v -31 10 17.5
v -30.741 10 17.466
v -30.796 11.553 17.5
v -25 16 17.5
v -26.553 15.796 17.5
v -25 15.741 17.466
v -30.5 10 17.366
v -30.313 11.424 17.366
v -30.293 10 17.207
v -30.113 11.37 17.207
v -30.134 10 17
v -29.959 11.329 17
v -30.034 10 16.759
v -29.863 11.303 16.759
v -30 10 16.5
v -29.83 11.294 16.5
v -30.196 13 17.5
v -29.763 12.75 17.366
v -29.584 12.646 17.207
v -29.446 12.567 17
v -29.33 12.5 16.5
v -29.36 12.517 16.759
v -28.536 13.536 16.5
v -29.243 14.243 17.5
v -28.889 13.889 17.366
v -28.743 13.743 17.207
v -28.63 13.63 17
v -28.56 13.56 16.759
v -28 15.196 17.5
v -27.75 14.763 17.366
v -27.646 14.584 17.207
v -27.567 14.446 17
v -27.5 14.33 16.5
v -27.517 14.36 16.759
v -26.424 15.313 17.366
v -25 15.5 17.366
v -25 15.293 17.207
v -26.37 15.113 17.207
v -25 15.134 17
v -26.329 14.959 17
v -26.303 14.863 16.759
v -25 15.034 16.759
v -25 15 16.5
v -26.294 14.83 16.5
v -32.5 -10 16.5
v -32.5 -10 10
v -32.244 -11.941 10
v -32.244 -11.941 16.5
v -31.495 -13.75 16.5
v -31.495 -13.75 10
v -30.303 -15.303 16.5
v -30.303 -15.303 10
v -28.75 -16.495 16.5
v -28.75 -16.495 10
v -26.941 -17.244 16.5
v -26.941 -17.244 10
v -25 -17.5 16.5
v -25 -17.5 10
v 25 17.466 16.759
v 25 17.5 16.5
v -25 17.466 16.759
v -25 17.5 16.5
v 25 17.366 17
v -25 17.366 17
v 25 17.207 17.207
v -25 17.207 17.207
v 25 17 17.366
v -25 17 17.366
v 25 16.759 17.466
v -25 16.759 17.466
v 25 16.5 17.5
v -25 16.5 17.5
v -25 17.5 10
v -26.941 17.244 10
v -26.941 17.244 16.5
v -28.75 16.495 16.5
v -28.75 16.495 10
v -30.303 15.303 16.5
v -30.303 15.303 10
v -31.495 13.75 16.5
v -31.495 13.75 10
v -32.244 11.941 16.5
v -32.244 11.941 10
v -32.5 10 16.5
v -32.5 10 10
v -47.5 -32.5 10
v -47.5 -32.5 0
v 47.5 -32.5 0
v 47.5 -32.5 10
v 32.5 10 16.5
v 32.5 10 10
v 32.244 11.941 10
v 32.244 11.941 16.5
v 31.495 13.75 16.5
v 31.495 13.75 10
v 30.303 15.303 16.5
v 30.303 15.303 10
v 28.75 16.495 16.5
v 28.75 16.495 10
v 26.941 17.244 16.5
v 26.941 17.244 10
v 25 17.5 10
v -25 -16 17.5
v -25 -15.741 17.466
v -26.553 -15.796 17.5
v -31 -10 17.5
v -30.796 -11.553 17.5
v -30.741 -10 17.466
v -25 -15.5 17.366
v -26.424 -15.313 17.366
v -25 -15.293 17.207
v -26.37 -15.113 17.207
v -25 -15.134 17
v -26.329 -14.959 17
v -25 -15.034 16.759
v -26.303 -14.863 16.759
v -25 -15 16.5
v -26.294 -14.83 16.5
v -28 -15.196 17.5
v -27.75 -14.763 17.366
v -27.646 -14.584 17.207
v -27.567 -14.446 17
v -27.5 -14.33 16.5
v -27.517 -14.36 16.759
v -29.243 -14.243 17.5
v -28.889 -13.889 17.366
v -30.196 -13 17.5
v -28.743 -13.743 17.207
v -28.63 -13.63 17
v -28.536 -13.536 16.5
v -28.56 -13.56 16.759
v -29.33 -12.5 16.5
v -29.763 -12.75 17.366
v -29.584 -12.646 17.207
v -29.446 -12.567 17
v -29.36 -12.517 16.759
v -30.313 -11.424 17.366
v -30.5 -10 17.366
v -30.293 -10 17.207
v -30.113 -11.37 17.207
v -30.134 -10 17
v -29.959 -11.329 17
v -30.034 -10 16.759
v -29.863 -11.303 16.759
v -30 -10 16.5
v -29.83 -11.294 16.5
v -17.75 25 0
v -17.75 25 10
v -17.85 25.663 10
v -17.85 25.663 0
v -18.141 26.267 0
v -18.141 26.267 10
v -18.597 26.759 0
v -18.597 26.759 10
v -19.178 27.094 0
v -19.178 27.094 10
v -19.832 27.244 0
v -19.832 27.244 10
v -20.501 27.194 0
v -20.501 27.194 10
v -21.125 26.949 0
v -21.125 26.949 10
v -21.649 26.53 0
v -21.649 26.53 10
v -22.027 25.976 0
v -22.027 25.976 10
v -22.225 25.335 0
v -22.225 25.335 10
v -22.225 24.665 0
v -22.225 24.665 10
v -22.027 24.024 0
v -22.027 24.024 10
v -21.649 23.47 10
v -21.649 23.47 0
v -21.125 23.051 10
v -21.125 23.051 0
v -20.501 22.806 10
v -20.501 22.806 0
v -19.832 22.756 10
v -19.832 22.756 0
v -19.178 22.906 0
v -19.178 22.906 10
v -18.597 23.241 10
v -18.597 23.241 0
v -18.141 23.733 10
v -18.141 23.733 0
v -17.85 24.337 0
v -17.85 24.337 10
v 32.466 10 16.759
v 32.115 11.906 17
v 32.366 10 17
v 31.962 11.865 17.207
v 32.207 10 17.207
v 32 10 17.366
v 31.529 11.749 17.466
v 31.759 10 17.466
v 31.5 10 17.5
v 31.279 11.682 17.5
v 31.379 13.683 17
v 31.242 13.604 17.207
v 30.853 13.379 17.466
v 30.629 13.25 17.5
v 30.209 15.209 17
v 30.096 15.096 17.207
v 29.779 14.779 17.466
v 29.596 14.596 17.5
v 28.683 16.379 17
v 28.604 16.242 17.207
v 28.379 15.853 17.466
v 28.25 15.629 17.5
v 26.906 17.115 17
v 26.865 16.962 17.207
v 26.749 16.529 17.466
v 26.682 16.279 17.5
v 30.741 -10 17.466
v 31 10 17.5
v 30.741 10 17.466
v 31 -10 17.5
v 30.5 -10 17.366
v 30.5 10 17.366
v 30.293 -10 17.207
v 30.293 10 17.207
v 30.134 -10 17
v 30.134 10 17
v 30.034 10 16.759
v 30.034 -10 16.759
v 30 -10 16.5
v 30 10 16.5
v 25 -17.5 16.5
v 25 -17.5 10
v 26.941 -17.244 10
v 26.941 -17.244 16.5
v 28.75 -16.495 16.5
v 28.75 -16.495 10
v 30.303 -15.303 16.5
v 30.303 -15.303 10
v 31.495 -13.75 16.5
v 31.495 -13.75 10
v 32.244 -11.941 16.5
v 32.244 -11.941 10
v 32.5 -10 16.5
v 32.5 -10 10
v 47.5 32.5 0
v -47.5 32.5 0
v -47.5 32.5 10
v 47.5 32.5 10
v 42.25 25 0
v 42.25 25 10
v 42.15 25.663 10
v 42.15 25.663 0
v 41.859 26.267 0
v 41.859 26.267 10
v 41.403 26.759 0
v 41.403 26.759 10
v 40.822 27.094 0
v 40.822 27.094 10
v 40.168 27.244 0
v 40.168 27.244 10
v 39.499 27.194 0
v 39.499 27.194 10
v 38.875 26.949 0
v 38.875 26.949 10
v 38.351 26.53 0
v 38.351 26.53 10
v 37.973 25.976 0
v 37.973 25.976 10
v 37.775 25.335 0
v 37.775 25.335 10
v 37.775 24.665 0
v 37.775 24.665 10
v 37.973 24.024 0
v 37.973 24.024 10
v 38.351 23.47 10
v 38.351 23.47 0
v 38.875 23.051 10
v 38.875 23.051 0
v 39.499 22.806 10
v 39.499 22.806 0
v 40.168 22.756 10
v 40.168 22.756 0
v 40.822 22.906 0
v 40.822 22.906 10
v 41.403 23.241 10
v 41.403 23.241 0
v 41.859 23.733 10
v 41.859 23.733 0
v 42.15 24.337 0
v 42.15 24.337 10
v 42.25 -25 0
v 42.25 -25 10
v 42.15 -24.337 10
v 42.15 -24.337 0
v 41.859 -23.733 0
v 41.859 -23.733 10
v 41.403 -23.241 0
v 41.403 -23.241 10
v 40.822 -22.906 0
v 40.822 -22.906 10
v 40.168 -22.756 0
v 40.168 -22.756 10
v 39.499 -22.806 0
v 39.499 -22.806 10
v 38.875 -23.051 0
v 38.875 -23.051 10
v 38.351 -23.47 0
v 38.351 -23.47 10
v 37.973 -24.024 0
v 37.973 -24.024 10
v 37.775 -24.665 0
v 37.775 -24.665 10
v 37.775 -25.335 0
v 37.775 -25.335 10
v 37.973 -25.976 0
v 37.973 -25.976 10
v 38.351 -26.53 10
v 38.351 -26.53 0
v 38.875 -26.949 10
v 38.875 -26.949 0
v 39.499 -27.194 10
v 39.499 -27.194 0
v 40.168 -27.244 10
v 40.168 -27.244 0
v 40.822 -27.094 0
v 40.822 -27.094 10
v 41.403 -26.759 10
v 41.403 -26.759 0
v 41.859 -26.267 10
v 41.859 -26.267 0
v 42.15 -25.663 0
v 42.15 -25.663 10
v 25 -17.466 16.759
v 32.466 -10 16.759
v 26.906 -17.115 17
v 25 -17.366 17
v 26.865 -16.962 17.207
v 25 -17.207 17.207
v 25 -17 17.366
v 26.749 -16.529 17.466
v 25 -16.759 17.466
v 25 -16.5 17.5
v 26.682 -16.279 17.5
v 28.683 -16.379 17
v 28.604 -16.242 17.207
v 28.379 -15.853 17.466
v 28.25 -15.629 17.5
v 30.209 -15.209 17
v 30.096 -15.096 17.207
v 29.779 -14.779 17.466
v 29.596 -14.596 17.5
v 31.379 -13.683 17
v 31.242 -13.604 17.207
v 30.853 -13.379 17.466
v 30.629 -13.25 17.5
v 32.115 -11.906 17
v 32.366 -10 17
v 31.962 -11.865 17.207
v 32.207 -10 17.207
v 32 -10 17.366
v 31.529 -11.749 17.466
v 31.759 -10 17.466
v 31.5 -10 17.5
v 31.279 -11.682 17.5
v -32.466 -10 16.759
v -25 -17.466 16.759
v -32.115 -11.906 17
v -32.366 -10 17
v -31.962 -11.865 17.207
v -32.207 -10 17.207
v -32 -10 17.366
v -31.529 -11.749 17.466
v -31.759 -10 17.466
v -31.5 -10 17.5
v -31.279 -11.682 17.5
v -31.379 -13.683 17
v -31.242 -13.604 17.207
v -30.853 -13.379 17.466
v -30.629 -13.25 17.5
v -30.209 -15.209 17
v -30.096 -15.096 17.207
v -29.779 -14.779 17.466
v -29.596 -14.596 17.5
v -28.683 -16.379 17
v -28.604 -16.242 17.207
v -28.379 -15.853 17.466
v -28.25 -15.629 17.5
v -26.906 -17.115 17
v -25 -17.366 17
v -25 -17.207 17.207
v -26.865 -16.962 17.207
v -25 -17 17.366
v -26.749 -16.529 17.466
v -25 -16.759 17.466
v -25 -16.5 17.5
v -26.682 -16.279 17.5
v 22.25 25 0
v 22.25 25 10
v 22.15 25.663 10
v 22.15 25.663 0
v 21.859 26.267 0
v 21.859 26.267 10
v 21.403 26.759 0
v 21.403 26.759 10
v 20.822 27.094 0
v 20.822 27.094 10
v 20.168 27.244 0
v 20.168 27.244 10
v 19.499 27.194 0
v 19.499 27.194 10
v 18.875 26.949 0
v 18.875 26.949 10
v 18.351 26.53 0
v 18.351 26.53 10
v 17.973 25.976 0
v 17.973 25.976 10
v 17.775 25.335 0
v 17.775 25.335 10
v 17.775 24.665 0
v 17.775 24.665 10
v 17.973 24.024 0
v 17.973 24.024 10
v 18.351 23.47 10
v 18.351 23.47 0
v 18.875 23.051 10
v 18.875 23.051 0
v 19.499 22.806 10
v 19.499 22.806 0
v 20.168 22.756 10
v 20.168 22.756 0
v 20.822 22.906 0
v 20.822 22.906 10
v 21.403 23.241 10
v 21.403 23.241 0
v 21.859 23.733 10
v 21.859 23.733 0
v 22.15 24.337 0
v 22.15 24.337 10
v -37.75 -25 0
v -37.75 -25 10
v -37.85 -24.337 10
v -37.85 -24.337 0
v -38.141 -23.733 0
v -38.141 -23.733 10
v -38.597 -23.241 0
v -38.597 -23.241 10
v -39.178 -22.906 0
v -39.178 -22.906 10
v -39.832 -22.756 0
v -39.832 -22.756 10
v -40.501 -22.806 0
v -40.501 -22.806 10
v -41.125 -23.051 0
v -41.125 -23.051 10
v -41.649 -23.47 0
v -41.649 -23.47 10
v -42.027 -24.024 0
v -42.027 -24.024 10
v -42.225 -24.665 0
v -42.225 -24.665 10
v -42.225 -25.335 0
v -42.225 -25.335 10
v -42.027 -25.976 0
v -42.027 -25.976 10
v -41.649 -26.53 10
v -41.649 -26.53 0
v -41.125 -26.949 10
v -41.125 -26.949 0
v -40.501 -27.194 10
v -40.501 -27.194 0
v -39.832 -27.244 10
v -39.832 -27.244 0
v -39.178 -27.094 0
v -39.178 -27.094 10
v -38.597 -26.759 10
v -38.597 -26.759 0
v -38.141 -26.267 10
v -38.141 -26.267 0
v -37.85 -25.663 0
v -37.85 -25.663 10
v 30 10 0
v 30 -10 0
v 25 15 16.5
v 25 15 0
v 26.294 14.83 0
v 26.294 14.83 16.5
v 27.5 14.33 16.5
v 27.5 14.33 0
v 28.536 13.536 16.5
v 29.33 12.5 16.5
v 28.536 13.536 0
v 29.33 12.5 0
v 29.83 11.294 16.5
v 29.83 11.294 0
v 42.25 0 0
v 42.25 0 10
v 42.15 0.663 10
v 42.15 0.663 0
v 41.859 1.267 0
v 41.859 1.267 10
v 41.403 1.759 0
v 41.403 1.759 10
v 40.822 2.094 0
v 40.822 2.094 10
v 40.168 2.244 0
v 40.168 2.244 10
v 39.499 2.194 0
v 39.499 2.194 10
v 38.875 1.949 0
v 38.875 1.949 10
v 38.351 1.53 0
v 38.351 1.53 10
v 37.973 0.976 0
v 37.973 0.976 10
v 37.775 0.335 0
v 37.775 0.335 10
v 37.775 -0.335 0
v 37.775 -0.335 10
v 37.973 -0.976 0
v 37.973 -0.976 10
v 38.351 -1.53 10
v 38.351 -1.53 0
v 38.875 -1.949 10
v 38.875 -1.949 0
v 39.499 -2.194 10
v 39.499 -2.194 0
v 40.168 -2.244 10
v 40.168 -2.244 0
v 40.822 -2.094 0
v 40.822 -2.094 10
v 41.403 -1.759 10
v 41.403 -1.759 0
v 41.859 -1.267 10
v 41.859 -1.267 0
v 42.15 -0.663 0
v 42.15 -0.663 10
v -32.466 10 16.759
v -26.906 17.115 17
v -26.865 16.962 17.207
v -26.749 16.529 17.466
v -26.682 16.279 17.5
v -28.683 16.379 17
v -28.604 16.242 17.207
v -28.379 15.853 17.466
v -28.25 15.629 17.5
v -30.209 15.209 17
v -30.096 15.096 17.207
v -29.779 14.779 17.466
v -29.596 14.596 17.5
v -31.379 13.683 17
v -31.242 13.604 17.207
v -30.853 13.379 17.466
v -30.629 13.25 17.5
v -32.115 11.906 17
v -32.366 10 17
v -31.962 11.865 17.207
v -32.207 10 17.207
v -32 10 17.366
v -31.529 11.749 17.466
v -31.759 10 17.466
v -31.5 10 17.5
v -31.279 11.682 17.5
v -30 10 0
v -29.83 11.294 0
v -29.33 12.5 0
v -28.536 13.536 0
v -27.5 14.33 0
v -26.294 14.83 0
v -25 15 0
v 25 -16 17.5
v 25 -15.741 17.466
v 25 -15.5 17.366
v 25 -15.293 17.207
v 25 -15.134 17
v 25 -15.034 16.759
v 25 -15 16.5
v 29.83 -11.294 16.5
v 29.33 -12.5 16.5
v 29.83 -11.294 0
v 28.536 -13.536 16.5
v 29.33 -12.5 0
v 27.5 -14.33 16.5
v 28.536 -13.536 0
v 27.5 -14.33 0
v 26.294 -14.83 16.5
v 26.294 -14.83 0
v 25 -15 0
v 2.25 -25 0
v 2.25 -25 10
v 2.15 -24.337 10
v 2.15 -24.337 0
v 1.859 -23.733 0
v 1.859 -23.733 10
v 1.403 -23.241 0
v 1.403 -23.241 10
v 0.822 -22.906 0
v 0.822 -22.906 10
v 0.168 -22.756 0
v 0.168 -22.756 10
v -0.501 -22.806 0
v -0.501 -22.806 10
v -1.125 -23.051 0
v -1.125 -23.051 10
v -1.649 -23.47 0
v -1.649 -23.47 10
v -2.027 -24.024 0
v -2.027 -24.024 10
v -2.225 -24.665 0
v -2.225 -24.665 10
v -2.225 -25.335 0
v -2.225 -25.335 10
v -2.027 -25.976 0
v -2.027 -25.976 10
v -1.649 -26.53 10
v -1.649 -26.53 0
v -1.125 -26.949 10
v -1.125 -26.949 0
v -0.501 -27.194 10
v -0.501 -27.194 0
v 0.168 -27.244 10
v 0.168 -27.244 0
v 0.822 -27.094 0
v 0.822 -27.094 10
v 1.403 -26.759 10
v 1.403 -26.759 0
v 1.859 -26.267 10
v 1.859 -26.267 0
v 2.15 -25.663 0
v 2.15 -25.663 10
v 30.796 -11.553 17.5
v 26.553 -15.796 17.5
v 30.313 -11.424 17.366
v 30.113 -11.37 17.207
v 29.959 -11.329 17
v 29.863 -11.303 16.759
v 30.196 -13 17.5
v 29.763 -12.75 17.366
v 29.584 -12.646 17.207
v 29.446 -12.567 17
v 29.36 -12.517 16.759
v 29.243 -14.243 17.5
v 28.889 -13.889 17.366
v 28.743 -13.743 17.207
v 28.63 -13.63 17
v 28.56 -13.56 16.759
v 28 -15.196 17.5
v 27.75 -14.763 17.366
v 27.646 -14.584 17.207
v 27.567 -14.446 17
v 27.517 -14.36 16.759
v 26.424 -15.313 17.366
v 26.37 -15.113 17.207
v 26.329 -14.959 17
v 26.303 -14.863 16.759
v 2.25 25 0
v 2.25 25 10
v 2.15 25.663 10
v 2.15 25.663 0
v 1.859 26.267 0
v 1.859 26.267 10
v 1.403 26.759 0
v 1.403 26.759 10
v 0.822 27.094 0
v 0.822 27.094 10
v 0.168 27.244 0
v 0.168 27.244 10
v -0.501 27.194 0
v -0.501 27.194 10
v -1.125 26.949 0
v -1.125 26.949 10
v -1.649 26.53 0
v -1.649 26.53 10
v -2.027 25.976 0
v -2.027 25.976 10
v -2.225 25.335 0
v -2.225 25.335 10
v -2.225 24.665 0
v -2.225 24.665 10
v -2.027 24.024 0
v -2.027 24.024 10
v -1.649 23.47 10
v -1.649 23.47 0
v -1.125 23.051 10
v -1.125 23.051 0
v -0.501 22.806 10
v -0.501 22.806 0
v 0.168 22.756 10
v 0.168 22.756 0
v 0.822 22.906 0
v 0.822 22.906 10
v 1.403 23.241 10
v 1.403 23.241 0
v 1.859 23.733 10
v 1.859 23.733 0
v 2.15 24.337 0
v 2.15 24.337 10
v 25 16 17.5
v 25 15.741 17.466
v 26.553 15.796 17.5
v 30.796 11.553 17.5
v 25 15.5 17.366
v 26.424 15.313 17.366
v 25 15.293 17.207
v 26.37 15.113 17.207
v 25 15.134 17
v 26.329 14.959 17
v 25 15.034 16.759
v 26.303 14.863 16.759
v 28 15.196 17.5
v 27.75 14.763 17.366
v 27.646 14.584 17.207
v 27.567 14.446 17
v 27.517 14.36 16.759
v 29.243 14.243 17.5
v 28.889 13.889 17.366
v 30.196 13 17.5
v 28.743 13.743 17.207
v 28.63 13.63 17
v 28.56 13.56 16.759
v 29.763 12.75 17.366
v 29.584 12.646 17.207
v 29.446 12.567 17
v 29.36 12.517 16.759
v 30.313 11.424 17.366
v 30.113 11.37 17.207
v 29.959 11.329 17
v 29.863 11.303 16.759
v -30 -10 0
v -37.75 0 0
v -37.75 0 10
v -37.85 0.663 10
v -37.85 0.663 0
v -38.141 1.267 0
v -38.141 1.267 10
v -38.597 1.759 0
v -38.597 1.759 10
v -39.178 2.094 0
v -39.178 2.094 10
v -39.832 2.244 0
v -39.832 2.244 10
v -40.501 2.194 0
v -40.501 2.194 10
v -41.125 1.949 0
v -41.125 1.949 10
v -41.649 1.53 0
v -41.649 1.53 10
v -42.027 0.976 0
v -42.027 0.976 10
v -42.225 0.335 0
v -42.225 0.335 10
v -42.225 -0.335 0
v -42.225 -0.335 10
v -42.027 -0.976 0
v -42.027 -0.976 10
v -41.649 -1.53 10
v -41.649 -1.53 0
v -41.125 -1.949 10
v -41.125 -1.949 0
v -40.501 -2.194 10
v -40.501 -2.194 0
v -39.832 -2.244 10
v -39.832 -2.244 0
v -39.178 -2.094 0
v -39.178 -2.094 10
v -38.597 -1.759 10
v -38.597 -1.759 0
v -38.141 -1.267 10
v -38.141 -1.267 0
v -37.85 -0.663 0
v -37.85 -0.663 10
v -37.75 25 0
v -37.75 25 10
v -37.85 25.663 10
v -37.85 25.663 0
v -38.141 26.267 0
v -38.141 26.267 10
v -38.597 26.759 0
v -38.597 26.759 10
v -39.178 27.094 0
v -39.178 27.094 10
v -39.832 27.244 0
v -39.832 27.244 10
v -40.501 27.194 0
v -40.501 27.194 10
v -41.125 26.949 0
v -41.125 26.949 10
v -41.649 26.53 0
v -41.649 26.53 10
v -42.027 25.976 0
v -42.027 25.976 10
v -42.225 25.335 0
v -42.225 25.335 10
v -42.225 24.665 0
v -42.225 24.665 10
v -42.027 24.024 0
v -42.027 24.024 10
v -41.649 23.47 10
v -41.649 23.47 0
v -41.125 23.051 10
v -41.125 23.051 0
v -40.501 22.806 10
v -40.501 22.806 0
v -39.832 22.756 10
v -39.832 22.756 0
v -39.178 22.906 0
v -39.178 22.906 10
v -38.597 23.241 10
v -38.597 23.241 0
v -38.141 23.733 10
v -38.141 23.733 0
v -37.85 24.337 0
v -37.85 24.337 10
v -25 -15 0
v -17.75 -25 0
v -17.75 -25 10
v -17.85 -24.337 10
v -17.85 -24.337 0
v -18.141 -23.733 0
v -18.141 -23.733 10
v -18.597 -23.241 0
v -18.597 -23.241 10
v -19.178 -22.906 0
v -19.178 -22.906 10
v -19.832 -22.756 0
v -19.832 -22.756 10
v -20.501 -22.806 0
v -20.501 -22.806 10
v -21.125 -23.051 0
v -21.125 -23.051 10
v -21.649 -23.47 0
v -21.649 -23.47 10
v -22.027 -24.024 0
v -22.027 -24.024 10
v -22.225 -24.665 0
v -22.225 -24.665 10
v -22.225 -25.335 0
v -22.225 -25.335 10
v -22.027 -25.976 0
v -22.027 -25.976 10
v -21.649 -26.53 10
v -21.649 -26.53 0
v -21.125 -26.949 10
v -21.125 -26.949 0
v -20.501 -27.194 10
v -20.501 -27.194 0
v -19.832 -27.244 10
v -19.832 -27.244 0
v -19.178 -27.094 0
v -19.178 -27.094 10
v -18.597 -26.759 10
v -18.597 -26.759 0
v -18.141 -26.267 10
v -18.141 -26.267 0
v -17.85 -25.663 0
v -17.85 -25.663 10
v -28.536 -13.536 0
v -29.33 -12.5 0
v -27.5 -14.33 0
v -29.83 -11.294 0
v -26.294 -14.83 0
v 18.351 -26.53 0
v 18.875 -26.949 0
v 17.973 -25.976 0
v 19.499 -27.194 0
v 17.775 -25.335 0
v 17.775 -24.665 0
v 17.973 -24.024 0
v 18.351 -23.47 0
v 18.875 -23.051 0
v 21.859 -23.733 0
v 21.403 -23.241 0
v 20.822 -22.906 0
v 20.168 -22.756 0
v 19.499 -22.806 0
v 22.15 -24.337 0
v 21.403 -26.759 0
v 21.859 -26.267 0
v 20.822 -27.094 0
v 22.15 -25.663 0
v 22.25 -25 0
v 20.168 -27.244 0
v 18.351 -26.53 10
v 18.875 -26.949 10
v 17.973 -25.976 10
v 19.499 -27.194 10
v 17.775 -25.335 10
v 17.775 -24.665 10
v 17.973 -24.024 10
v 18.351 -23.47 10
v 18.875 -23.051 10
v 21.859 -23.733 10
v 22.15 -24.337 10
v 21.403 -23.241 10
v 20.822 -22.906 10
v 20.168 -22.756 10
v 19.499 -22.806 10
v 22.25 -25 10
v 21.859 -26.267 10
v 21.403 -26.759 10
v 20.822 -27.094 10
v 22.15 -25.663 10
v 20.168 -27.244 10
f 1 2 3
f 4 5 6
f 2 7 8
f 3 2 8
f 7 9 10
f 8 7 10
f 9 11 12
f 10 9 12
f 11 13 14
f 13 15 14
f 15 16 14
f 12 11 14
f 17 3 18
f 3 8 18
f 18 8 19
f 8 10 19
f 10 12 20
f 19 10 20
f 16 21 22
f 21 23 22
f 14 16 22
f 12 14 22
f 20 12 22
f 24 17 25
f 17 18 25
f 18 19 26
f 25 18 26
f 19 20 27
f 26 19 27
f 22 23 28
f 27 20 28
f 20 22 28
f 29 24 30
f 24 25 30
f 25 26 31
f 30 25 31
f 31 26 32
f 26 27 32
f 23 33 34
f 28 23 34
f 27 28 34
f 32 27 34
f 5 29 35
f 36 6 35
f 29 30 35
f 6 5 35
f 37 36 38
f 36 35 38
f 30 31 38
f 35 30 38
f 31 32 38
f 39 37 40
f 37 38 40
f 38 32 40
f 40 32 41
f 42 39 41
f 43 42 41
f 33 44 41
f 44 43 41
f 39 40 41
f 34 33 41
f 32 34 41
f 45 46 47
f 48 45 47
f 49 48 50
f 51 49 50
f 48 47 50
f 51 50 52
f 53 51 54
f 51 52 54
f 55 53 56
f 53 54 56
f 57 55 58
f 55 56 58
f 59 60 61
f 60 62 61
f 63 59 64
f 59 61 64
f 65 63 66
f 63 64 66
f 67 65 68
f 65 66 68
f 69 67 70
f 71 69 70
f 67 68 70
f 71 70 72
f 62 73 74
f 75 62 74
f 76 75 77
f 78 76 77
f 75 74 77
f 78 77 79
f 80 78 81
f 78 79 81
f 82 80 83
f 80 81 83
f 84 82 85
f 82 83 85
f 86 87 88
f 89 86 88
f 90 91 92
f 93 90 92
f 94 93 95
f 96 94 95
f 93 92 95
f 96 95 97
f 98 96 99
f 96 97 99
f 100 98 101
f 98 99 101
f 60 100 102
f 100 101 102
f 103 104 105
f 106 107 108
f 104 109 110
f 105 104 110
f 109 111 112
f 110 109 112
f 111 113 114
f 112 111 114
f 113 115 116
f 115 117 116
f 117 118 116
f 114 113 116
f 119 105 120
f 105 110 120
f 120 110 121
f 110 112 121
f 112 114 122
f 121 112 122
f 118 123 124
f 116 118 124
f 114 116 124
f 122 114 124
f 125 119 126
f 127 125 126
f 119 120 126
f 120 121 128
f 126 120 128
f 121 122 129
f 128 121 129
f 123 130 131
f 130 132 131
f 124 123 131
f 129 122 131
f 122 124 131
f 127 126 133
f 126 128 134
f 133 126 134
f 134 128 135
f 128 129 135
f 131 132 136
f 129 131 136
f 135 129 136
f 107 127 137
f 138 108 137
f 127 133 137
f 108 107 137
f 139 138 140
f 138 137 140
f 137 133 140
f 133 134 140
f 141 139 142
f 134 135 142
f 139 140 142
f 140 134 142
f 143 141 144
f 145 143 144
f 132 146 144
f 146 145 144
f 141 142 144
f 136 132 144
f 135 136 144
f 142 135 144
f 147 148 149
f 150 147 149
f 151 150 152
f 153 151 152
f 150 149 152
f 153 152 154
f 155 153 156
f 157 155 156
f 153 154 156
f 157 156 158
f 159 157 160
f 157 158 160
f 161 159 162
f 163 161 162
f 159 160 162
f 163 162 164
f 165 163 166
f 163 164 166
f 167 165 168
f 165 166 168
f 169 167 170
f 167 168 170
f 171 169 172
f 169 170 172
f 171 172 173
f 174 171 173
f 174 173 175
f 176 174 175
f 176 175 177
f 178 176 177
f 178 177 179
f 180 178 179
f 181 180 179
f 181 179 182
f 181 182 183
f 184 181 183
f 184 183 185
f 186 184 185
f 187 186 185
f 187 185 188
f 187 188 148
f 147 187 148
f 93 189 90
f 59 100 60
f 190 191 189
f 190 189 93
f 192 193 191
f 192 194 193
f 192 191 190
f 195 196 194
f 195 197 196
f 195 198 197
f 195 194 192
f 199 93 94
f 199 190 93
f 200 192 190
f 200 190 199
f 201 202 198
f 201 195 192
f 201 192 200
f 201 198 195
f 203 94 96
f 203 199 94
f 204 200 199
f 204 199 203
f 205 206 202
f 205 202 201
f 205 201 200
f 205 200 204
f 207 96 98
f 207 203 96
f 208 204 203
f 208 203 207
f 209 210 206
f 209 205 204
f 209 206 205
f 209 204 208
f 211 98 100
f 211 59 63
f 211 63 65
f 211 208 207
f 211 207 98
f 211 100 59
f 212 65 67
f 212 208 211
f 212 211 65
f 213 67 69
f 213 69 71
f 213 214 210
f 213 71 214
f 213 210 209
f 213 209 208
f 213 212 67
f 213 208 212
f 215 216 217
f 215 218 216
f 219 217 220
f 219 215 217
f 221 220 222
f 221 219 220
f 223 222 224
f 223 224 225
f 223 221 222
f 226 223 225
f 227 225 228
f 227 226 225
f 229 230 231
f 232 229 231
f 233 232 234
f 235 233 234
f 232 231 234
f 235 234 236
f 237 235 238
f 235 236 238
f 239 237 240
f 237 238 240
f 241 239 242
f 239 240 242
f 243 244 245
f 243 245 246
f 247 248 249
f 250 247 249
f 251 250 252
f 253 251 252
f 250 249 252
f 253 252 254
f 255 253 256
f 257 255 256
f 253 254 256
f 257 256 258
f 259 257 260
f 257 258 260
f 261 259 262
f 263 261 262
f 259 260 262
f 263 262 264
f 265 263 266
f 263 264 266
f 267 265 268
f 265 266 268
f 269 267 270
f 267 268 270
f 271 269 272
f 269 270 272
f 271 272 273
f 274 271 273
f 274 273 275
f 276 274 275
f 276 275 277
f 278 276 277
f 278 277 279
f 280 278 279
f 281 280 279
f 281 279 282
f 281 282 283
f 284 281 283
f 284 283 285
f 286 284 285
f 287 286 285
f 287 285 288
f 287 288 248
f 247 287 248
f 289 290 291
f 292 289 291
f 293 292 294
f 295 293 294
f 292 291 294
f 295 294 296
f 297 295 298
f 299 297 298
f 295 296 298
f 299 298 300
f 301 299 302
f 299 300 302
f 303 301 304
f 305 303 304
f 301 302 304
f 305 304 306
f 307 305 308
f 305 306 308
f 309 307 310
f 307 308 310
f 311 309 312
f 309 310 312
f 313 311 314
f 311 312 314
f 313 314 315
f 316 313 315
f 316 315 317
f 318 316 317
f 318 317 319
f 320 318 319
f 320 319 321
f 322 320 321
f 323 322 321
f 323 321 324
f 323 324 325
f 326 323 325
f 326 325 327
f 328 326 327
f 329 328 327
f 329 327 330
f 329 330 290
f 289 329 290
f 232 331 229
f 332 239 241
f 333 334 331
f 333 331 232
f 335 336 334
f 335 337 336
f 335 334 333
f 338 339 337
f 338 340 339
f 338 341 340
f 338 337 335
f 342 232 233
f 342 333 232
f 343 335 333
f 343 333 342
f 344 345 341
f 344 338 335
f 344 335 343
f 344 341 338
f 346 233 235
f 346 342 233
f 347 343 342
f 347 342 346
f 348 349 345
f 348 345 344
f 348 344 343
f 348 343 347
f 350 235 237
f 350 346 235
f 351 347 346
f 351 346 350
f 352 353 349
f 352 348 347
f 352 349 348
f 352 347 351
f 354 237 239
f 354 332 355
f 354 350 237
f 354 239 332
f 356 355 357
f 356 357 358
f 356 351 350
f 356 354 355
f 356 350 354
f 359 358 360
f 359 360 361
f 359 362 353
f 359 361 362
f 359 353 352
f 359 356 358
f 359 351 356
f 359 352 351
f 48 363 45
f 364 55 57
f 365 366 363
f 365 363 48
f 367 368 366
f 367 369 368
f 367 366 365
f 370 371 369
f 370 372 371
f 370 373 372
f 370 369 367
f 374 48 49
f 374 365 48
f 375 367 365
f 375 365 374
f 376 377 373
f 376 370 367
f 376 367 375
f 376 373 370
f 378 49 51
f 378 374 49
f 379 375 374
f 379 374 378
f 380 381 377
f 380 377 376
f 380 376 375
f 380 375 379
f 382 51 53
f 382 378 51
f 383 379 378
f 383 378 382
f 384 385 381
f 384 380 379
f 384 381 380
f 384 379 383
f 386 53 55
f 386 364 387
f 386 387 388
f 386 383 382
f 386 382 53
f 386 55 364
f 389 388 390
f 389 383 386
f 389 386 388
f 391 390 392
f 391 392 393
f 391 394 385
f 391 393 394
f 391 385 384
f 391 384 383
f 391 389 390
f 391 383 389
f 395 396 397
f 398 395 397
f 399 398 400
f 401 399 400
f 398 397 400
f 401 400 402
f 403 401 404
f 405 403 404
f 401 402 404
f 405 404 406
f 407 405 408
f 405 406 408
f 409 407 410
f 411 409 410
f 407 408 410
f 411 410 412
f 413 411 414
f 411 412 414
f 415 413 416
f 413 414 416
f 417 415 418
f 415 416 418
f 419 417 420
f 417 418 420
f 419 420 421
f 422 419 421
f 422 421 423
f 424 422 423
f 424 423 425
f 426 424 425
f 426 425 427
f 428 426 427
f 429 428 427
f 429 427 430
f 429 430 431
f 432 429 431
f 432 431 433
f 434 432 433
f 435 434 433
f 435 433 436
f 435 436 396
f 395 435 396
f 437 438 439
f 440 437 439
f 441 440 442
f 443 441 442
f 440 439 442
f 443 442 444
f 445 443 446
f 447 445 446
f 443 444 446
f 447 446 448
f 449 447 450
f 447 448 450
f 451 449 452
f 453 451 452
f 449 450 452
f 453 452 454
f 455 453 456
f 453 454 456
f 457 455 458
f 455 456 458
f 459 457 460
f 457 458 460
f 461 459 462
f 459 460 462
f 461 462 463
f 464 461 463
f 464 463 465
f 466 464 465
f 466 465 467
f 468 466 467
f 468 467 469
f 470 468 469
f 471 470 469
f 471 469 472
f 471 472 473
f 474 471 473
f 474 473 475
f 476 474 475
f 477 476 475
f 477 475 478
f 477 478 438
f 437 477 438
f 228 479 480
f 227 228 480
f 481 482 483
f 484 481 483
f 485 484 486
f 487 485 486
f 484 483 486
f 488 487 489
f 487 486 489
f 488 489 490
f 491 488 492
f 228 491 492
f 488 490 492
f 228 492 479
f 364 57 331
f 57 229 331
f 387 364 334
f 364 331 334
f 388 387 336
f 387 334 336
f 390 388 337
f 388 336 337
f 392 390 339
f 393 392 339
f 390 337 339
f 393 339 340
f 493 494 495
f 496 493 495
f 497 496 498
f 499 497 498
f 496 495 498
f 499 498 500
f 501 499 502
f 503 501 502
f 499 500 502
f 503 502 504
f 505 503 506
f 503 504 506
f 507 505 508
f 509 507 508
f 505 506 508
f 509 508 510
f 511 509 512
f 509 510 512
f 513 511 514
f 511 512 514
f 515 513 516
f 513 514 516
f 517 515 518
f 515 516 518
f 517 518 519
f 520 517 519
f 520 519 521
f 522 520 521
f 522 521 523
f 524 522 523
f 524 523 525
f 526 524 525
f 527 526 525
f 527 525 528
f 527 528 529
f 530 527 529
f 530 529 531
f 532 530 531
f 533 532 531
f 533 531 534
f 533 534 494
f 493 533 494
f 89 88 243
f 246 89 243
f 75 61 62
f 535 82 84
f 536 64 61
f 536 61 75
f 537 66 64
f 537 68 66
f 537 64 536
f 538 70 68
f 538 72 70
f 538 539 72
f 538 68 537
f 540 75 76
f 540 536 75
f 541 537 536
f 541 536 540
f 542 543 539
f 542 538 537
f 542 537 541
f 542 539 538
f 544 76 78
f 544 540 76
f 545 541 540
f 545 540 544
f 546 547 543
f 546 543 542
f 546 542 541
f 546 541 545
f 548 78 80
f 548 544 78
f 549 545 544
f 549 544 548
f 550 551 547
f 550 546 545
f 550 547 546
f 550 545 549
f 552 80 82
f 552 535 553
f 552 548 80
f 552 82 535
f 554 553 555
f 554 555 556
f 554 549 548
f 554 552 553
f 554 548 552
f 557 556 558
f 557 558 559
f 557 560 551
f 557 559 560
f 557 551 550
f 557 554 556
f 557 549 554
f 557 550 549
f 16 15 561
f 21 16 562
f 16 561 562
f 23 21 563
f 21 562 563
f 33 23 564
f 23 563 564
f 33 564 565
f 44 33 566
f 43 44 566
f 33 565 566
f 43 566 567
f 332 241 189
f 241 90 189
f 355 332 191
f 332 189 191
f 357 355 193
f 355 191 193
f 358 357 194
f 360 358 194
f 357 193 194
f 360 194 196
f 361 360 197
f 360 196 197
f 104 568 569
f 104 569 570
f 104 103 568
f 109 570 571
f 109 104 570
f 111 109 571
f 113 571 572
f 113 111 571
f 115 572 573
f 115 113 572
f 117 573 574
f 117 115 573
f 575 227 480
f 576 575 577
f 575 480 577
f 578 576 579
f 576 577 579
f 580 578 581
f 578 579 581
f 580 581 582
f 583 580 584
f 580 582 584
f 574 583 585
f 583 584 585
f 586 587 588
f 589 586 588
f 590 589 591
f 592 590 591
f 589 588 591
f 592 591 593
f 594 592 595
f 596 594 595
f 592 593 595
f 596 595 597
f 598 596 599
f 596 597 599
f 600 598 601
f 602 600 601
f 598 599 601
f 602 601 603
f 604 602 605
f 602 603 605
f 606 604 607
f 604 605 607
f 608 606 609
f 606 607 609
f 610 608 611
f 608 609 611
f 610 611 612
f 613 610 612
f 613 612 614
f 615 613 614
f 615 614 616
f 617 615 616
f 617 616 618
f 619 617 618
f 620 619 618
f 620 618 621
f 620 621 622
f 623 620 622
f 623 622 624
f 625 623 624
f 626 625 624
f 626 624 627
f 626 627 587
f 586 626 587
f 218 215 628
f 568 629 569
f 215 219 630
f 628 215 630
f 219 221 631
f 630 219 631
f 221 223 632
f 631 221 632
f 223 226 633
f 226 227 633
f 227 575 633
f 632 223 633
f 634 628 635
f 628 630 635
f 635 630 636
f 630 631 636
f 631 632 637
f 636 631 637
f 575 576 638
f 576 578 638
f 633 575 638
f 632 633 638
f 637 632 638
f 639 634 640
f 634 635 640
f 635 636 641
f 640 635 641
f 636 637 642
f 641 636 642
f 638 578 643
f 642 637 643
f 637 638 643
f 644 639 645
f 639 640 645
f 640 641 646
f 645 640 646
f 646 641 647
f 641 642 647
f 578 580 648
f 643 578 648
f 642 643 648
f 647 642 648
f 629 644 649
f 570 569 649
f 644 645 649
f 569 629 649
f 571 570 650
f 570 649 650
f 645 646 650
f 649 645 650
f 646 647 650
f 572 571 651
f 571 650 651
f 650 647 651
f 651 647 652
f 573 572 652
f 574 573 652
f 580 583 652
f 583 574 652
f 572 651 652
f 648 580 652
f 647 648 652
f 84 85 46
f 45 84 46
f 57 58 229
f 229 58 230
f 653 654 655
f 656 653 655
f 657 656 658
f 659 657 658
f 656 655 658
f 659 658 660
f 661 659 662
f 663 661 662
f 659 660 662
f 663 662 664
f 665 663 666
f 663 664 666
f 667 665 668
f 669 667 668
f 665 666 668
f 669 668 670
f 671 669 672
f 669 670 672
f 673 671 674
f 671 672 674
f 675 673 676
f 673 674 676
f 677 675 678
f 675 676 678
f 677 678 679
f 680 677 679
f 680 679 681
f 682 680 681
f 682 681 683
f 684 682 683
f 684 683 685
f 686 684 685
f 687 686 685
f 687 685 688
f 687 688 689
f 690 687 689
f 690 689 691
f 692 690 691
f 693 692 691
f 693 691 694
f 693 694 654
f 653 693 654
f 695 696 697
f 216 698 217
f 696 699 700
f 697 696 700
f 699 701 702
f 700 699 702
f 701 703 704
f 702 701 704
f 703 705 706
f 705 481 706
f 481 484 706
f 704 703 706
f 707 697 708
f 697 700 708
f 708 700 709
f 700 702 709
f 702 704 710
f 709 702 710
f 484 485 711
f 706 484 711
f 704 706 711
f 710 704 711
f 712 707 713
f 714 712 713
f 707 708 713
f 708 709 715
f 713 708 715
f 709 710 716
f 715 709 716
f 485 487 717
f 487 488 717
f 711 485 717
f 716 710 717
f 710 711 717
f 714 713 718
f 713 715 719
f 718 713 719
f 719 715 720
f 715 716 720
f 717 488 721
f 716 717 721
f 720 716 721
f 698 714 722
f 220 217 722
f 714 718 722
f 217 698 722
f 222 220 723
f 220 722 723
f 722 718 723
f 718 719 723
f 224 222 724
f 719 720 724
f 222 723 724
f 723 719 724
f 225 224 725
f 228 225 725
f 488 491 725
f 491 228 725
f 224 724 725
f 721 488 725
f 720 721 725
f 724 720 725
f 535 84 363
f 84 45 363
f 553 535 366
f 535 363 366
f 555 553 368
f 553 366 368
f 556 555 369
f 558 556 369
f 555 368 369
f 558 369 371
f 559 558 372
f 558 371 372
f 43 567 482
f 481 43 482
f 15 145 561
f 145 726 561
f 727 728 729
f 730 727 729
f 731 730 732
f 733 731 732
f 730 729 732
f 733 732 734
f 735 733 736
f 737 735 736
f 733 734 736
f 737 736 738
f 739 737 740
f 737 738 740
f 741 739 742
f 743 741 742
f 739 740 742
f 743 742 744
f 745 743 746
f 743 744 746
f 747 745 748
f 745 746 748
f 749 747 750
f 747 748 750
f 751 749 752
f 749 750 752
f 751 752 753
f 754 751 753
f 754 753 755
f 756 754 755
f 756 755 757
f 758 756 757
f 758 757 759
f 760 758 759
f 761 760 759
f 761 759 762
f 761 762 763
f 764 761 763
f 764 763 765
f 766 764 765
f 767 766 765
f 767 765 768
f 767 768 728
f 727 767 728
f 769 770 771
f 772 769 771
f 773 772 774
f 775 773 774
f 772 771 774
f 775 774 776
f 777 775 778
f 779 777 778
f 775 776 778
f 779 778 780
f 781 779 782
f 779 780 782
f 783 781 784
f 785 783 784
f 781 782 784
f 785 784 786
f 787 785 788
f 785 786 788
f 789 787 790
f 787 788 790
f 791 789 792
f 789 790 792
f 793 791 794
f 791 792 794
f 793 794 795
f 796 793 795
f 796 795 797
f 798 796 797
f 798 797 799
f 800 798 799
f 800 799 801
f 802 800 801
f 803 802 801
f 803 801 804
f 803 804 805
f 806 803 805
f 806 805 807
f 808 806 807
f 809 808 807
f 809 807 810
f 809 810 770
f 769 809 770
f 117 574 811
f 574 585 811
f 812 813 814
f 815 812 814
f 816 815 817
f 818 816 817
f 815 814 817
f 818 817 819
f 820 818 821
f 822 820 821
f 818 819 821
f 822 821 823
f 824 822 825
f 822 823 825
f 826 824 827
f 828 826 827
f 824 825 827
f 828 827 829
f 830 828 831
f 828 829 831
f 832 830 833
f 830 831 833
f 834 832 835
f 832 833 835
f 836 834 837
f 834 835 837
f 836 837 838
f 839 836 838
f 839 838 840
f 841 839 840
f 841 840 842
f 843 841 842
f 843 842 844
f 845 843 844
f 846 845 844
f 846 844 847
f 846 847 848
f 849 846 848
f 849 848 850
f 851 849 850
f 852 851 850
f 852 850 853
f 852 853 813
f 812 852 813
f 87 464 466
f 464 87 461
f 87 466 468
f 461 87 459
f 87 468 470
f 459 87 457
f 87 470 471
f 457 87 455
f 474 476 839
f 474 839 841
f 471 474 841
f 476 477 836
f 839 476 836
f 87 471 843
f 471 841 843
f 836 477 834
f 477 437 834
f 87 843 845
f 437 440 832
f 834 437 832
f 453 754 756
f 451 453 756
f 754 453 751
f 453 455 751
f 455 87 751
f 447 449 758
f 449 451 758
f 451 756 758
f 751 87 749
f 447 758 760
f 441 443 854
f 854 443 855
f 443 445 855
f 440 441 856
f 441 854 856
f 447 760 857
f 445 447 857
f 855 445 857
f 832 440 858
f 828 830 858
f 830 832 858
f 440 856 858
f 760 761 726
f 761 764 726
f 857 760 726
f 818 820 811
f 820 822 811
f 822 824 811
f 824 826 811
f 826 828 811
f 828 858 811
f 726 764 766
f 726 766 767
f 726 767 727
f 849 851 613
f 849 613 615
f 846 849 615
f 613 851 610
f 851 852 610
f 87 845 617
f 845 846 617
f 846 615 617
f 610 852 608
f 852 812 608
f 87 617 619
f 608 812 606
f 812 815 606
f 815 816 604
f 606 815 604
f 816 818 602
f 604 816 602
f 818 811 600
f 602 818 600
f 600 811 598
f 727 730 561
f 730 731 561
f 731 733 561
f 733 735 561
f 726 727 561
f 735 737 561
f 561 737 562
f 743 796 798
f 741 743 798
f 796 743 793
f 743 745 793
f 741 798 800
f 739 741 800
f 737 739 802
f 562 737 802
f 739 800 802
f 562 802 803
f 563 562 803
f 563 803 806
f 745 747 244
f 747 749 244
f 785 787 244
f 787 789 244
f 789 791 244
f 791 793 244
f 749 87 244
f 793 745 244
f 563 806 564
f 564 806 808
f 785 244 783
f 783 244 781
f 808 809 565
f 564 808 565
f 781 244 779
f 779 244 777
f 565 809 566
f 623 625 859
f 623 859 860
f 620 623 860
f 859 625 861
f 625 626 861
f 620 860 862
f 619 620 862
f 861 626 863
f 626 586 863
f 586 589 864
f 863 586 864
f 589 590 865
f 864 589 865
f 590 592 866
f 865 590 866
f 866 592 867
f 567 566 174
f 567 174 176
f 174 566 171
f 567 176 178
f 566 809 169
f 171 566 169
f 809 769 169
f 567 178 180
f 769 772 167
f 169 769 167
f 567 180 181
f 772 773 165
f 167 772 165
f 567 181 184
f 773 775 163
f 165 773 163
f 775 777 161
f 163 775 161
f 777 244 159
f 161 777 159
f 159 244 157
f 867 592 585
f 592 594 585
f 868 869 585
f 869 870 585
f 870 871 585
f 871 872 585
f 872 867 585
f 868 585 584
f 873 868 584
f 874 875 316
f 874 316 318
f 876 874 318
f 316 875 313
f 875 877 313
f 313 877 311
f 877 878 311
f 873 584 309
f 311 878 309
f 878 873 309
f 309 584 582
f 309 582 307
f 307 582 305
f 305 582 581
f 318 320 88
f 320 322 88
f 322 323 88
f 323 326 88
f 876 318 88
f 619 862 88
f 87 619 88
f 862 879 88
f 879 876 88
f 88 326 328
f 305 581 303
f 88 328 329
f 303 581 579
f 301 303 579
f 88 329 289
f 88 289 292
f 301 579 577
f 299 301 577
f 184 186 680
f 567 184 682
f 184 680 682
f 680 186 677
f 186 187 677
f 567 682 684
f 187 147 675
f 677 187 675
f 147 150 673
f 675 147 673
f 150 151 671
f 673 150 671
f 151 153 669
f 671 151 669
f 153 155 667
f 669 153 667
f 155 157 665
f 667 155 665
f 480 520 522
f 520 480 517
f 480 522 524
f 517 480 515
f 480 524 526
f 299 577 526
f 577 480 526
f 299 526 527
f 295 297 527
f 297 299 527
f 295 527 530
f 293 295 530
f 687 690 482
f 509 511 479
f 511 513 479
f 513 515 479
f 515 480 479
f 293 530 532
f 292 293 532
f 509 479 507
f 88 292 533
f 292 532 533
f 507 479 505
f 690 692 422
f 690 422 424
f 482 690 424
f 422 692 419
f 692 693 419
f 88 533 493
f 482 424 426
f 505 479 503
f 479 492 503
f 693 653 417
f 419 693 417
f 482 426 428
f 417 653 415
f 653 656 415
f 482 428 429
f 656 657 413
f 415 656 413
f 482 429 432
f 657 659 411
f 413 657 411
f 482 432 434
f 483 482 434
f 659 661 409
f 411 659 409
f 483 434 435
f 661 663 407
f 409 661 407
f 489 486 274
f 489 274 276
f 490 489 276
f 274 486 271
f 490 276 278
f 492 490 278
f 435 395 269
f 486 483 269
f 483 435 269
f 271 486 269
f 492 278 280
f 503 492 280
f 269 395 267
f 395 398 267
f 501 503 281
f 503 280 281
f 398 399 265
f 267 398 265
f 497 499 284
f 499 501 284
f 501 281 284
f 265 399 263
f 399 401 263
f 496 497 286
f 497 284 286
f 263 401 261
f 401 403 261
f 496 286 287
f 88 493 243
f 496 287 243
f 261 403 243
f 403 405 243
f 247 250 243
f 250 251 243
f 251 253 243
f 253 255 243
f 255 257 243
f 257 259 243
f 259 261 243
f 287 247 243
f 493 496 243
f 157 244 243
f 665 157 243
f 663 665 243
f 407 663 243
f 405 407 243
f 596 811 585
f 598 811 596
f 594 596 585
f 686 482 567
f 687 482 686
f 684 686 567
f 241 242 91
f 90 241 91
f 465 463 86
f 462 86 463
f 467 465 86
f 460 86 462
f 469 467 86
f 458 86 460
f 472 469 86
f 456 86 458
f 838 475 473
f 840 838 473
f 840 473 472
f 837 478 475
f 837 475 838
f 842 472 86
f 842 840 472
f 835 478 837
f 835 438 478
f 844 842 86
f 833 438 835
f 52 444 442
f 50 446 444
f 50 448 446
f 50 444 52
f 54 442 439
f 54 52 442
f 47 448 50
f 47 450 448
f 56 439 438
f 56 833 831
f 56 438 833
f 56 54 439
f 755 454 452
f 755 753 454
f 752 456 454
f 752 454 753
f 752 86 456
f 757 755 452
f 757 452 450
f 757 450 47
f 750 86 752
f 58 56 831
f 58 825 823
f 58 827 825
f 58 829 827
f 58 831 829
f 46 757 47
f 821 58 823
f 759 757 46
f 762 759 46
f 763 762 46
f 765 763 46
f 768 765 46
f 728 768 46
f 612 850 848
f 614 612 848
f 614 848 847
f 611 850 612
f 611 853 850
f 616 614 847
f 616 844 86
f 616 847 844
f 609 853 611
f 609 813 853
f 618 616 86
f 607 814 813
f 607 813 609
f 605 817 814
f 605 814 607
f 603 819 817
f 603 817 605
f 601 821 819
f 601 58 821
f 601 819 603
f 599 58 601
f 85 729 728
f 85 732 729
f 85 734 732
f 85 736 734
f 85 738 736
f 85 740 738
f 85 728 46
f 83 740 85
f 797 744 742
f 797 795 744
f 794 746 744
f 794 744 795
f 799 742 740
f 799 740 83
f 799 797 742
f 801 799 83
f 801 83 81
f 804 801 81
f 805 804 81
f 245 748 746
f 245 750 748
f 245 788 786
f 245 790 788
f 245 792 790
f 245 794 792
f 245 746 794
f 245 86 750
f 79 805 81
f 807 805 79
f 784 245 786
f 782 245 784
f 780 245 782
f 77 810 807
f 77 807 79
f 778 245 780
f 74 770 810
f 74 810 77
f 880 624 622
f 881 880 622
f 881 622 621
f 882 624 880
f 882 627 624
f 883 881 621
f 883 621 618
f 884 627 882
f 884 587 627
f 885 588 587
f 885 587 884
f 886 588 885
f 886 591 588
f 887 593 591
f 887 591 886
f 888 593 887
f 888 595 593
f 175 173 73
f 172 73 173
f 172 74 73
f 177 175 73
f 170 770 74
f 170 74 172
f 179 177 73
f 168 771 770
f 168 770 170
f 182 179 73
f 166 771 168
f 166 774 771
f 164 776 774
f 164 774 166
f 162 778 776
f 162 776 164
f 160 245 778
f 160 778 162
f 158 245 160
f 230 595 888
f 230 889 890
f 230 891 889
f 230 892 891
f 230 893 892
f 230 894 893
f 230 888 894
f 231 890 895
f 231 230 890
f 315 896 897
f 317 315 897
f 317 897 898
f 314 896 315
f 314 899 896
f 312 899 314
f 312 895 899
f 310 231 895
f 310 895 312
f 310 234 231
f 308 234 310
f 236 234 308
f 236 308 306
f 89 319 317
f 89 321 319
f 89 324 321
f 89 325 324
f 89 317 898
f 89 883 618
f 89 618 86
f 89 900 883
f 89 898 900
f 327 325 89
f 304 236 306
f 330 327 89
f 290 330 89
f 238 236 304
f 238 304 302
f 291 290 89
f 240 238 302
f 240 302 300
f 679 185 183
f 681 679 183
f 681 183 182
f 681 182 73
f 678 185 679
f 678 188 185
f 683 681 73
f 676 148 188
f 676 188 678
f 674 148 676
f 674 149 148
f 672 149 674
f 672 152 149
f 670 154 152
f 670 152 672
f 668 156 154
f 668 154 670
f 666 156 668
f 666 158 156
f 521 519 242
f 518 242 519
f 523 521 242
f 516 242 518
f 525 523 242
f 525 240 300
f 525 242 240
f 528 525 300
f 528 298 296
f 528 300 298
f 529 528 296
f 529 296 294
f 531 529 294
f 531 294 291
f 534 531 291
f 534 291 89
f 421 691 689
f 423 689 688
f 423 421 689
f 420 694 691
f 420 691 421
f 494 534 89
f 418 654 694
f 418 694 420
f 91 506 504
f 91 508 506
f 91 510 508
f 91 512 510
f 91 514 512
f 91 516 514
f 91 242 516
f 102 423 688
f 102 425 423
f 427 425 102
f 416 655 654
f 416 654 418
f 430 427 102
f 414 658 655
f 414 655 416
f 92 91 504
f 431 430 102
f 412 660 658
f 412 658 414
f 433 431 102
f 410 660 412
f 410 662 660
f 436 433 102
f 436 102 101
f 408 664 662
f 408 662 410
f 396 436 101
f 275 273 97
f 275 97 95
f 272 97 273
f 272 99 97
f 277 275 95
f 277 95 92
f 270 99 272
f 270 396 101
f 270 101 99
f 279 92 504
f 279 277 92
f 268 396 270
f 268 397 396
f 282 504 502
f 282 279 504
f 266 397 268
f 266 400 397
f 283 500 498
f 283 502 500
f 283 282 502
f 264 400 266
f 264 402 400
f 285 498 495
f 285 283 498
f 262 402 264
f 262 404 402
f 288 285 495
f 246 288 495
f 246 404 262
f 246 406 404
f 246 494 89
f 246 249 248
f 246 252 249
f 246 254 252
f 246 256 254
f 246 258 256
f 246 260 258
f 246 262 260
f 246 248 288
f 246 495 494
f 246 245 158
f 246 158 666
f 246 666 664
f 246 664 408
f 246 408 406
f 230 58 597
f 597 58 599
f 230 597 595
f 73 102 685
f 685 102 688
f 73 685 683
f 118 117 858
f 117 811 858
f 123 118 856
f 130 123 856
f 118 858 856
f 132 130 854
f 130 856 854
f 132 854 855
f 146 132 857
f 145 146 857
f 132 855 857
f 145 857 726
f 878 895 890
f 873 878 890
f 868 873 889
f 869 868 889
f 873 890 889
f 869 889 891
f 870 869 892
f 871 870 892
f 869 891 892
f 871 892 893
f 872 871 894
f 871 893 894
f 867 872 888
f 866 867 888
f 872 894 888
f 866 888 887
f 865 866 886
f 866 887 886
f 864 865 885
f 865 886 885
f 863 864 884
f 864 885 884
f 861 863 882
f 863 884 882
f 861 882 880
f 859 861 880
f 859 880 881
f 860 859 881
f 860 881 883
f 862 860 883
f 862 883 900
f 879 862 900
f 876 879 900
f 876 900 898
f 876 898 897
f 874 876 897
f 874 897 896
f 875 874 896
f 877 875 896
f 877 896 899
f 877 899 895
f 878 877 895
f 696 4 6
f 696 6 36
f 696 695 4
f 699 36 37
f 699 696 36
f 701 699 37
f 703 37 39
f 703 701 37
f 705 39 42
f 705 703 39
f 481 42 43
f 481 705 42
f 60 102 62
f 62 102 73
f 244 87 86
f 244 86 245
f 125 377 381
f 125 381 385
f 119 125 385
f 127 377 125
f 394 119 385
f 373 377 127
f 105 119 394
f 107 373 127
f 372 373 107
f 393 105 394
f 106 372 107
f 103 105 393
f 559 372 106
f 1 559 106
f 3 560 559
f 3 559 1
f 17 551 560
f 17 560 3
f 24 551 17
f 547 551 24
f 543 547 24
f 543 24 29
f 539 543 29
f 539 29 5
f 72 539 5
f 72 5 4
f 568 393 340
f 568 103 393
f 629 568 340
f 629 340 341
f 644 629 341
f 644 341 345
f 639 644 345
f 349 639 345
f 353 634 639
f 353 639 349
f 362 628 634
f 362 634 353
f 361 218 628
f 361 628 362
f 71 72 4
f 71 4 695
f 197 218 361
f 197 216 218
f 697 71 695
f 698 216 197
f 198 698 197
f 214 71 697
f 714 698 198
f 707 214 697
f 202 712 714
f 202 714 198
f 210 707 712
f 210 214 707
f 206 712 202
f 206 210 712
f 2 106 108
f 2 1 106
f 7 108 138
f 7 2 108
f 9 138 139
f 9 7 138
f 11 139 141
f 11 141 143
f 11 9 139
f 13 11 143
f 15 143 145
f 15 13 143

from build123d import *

# Parameters (mm, degrees)
F0_W     = 95
F0_H     = 65
F1_DEPTH = 10
F3_DEPTH = 7.5
F4_R     = 1
F6_DEPTH = 10.001
F7_R     = 2.25
F8_DEPTH = 10.001


with BuildPart() as f1:
    # F0 (on Top) → F1 (new body)
    with BuildSketch(Plane.XY):
        Rectangle(F0_W, F0_H)
    extrude(amount=F1_DEPTH)

    # F2 (on face) → F3 (join)
    with BuildSketch(Plane.XY.offset(10)):
        with BuildLine():
            Line((32.5, -10), (32.5, 10))
            ThreePointArc((32.5, 10), (30.303301, 15.303301), (25, 17.5))
            Line((25, 17.5), (-25, 17.5))
            ThreePointArc((-25, 17.5), (-30.303301, 15.303301), (-32.5, 10))
            Line((-32.5, 10), (-32.5, -10))
            ThreePointArc((-32.5, -10), (-30.303301, -15.303301), (-25, -17.5))
            Line((-25, -17.5), (25, -17.5))
            ThreePointArc((25, -17.5), (30.303301, -15.303301), (32.5, -10))
        make_face()
        with BuildLine():
            ThreePointArc((30, -10), (28.535534, -13.535534), (25, -15))
            Line((25, -15), (-25, -15))
            ThreePointArc((-25, -15), (-28.535534, -13.535534), (-30, -10))
            Line((-30, -10), (-30, 10))
            ThreePointArc((-30, 10), (-28.535534, 13.535534), (-25, 15))
            Line((-25, 15), (25, 15))
            ThreePointArc((25, 15), (28.535534, 13.535534), (30, 10))
            Line((30, 10), (30, -10))
        make_face(mode=Mode.SUBTRACT)
    extrude(amount=F3_DEPTH)

    # F4
    f4_edges = [f1.edges().sort_by_distance(p)[0] for p in [
        (32.5, 0, 17.5),
        (30.303301, 15.303301, 17.5),
        (0, 17.5, 17.5),
        (-30.303301, 15.303301, 17.5),
        (-32.5, 0, 17.5),
        (-30.303301, -15.303301, 17.5),
        (0, -17.5, 17.5),
        (30.303301, -15.303301, 17.5),
        (28.535534, -13.535534, 17.5),
        (0, -15, 17.5),
        (-28.535534, -13.535534, 17.5),
        (-30, 0, 17.5),
        (-28.535534, 13.535534, 17.5),
        (0, 15, 17.5),
        (28.535534, 13.535534, 17.5),
        (30, 0, 17.5),
    ]]
    fillet(f4_edges, radius=F4_R)

    # F5 (on face) → F6 (cut, through all)
    with BuildSketch(Plane.XY.offset(10)):
        with BuildLine():
            Line((-25, -15), (25, -15))
            ThreePointArc((25, -15), (28.535534, -13.535534), (30, -10))
            Line((30, -10), (30, 10))
            ThreePointArc((30, 10), (28.535534, 13.535534), (25, 15))
            Line((25, 15), (-25, 15))
            ThreePointArc((-25, 15), (-28.535534, 13.535534), (-30, 10))
            Line((-30, 10), (-30, -10))
            ThreePointArc((-30, -10), (-28.535534, -13.535534), (-25, -15))
        make_face()
    extrude(amount=-F6_DEPTH, mode=Mode.SUBTRACT)

    # F7 (on face) → F8 (cut, through all)
    with BuildSketch(Plane.XY.offset(10)):
        with Locations((-40, 25)):
            Circle(F7_R)
        with Locations((-40, 0)):
            Circle(F7_R)
        with Locations((-40, -25)):
            Circle(F7_R)
        with Locations((-20, 25)):
            Circle(F7_R)
        with Locations((-20, -25)):
            Circle(F7_R)
        with Locations((0, 25)):
            Circle(F7_R)
        with Locations((0, -25)):
            Circle(F7_R)
        with Locations((20, 25)):
            Circle(F7_R)
        with Locations((20, -25)):
            Circle(F7_R)
        with Locations((40, 25)):
            Circle(F7_R)
        with Locations((40, 0)):
            Circle(F7_R)
        with Locations((40, -25)):
            Circle(F7_R)
    extrude(amount=-F8_DEPTH, mode=Mode.SUBTRACT)


solid = f1.part
